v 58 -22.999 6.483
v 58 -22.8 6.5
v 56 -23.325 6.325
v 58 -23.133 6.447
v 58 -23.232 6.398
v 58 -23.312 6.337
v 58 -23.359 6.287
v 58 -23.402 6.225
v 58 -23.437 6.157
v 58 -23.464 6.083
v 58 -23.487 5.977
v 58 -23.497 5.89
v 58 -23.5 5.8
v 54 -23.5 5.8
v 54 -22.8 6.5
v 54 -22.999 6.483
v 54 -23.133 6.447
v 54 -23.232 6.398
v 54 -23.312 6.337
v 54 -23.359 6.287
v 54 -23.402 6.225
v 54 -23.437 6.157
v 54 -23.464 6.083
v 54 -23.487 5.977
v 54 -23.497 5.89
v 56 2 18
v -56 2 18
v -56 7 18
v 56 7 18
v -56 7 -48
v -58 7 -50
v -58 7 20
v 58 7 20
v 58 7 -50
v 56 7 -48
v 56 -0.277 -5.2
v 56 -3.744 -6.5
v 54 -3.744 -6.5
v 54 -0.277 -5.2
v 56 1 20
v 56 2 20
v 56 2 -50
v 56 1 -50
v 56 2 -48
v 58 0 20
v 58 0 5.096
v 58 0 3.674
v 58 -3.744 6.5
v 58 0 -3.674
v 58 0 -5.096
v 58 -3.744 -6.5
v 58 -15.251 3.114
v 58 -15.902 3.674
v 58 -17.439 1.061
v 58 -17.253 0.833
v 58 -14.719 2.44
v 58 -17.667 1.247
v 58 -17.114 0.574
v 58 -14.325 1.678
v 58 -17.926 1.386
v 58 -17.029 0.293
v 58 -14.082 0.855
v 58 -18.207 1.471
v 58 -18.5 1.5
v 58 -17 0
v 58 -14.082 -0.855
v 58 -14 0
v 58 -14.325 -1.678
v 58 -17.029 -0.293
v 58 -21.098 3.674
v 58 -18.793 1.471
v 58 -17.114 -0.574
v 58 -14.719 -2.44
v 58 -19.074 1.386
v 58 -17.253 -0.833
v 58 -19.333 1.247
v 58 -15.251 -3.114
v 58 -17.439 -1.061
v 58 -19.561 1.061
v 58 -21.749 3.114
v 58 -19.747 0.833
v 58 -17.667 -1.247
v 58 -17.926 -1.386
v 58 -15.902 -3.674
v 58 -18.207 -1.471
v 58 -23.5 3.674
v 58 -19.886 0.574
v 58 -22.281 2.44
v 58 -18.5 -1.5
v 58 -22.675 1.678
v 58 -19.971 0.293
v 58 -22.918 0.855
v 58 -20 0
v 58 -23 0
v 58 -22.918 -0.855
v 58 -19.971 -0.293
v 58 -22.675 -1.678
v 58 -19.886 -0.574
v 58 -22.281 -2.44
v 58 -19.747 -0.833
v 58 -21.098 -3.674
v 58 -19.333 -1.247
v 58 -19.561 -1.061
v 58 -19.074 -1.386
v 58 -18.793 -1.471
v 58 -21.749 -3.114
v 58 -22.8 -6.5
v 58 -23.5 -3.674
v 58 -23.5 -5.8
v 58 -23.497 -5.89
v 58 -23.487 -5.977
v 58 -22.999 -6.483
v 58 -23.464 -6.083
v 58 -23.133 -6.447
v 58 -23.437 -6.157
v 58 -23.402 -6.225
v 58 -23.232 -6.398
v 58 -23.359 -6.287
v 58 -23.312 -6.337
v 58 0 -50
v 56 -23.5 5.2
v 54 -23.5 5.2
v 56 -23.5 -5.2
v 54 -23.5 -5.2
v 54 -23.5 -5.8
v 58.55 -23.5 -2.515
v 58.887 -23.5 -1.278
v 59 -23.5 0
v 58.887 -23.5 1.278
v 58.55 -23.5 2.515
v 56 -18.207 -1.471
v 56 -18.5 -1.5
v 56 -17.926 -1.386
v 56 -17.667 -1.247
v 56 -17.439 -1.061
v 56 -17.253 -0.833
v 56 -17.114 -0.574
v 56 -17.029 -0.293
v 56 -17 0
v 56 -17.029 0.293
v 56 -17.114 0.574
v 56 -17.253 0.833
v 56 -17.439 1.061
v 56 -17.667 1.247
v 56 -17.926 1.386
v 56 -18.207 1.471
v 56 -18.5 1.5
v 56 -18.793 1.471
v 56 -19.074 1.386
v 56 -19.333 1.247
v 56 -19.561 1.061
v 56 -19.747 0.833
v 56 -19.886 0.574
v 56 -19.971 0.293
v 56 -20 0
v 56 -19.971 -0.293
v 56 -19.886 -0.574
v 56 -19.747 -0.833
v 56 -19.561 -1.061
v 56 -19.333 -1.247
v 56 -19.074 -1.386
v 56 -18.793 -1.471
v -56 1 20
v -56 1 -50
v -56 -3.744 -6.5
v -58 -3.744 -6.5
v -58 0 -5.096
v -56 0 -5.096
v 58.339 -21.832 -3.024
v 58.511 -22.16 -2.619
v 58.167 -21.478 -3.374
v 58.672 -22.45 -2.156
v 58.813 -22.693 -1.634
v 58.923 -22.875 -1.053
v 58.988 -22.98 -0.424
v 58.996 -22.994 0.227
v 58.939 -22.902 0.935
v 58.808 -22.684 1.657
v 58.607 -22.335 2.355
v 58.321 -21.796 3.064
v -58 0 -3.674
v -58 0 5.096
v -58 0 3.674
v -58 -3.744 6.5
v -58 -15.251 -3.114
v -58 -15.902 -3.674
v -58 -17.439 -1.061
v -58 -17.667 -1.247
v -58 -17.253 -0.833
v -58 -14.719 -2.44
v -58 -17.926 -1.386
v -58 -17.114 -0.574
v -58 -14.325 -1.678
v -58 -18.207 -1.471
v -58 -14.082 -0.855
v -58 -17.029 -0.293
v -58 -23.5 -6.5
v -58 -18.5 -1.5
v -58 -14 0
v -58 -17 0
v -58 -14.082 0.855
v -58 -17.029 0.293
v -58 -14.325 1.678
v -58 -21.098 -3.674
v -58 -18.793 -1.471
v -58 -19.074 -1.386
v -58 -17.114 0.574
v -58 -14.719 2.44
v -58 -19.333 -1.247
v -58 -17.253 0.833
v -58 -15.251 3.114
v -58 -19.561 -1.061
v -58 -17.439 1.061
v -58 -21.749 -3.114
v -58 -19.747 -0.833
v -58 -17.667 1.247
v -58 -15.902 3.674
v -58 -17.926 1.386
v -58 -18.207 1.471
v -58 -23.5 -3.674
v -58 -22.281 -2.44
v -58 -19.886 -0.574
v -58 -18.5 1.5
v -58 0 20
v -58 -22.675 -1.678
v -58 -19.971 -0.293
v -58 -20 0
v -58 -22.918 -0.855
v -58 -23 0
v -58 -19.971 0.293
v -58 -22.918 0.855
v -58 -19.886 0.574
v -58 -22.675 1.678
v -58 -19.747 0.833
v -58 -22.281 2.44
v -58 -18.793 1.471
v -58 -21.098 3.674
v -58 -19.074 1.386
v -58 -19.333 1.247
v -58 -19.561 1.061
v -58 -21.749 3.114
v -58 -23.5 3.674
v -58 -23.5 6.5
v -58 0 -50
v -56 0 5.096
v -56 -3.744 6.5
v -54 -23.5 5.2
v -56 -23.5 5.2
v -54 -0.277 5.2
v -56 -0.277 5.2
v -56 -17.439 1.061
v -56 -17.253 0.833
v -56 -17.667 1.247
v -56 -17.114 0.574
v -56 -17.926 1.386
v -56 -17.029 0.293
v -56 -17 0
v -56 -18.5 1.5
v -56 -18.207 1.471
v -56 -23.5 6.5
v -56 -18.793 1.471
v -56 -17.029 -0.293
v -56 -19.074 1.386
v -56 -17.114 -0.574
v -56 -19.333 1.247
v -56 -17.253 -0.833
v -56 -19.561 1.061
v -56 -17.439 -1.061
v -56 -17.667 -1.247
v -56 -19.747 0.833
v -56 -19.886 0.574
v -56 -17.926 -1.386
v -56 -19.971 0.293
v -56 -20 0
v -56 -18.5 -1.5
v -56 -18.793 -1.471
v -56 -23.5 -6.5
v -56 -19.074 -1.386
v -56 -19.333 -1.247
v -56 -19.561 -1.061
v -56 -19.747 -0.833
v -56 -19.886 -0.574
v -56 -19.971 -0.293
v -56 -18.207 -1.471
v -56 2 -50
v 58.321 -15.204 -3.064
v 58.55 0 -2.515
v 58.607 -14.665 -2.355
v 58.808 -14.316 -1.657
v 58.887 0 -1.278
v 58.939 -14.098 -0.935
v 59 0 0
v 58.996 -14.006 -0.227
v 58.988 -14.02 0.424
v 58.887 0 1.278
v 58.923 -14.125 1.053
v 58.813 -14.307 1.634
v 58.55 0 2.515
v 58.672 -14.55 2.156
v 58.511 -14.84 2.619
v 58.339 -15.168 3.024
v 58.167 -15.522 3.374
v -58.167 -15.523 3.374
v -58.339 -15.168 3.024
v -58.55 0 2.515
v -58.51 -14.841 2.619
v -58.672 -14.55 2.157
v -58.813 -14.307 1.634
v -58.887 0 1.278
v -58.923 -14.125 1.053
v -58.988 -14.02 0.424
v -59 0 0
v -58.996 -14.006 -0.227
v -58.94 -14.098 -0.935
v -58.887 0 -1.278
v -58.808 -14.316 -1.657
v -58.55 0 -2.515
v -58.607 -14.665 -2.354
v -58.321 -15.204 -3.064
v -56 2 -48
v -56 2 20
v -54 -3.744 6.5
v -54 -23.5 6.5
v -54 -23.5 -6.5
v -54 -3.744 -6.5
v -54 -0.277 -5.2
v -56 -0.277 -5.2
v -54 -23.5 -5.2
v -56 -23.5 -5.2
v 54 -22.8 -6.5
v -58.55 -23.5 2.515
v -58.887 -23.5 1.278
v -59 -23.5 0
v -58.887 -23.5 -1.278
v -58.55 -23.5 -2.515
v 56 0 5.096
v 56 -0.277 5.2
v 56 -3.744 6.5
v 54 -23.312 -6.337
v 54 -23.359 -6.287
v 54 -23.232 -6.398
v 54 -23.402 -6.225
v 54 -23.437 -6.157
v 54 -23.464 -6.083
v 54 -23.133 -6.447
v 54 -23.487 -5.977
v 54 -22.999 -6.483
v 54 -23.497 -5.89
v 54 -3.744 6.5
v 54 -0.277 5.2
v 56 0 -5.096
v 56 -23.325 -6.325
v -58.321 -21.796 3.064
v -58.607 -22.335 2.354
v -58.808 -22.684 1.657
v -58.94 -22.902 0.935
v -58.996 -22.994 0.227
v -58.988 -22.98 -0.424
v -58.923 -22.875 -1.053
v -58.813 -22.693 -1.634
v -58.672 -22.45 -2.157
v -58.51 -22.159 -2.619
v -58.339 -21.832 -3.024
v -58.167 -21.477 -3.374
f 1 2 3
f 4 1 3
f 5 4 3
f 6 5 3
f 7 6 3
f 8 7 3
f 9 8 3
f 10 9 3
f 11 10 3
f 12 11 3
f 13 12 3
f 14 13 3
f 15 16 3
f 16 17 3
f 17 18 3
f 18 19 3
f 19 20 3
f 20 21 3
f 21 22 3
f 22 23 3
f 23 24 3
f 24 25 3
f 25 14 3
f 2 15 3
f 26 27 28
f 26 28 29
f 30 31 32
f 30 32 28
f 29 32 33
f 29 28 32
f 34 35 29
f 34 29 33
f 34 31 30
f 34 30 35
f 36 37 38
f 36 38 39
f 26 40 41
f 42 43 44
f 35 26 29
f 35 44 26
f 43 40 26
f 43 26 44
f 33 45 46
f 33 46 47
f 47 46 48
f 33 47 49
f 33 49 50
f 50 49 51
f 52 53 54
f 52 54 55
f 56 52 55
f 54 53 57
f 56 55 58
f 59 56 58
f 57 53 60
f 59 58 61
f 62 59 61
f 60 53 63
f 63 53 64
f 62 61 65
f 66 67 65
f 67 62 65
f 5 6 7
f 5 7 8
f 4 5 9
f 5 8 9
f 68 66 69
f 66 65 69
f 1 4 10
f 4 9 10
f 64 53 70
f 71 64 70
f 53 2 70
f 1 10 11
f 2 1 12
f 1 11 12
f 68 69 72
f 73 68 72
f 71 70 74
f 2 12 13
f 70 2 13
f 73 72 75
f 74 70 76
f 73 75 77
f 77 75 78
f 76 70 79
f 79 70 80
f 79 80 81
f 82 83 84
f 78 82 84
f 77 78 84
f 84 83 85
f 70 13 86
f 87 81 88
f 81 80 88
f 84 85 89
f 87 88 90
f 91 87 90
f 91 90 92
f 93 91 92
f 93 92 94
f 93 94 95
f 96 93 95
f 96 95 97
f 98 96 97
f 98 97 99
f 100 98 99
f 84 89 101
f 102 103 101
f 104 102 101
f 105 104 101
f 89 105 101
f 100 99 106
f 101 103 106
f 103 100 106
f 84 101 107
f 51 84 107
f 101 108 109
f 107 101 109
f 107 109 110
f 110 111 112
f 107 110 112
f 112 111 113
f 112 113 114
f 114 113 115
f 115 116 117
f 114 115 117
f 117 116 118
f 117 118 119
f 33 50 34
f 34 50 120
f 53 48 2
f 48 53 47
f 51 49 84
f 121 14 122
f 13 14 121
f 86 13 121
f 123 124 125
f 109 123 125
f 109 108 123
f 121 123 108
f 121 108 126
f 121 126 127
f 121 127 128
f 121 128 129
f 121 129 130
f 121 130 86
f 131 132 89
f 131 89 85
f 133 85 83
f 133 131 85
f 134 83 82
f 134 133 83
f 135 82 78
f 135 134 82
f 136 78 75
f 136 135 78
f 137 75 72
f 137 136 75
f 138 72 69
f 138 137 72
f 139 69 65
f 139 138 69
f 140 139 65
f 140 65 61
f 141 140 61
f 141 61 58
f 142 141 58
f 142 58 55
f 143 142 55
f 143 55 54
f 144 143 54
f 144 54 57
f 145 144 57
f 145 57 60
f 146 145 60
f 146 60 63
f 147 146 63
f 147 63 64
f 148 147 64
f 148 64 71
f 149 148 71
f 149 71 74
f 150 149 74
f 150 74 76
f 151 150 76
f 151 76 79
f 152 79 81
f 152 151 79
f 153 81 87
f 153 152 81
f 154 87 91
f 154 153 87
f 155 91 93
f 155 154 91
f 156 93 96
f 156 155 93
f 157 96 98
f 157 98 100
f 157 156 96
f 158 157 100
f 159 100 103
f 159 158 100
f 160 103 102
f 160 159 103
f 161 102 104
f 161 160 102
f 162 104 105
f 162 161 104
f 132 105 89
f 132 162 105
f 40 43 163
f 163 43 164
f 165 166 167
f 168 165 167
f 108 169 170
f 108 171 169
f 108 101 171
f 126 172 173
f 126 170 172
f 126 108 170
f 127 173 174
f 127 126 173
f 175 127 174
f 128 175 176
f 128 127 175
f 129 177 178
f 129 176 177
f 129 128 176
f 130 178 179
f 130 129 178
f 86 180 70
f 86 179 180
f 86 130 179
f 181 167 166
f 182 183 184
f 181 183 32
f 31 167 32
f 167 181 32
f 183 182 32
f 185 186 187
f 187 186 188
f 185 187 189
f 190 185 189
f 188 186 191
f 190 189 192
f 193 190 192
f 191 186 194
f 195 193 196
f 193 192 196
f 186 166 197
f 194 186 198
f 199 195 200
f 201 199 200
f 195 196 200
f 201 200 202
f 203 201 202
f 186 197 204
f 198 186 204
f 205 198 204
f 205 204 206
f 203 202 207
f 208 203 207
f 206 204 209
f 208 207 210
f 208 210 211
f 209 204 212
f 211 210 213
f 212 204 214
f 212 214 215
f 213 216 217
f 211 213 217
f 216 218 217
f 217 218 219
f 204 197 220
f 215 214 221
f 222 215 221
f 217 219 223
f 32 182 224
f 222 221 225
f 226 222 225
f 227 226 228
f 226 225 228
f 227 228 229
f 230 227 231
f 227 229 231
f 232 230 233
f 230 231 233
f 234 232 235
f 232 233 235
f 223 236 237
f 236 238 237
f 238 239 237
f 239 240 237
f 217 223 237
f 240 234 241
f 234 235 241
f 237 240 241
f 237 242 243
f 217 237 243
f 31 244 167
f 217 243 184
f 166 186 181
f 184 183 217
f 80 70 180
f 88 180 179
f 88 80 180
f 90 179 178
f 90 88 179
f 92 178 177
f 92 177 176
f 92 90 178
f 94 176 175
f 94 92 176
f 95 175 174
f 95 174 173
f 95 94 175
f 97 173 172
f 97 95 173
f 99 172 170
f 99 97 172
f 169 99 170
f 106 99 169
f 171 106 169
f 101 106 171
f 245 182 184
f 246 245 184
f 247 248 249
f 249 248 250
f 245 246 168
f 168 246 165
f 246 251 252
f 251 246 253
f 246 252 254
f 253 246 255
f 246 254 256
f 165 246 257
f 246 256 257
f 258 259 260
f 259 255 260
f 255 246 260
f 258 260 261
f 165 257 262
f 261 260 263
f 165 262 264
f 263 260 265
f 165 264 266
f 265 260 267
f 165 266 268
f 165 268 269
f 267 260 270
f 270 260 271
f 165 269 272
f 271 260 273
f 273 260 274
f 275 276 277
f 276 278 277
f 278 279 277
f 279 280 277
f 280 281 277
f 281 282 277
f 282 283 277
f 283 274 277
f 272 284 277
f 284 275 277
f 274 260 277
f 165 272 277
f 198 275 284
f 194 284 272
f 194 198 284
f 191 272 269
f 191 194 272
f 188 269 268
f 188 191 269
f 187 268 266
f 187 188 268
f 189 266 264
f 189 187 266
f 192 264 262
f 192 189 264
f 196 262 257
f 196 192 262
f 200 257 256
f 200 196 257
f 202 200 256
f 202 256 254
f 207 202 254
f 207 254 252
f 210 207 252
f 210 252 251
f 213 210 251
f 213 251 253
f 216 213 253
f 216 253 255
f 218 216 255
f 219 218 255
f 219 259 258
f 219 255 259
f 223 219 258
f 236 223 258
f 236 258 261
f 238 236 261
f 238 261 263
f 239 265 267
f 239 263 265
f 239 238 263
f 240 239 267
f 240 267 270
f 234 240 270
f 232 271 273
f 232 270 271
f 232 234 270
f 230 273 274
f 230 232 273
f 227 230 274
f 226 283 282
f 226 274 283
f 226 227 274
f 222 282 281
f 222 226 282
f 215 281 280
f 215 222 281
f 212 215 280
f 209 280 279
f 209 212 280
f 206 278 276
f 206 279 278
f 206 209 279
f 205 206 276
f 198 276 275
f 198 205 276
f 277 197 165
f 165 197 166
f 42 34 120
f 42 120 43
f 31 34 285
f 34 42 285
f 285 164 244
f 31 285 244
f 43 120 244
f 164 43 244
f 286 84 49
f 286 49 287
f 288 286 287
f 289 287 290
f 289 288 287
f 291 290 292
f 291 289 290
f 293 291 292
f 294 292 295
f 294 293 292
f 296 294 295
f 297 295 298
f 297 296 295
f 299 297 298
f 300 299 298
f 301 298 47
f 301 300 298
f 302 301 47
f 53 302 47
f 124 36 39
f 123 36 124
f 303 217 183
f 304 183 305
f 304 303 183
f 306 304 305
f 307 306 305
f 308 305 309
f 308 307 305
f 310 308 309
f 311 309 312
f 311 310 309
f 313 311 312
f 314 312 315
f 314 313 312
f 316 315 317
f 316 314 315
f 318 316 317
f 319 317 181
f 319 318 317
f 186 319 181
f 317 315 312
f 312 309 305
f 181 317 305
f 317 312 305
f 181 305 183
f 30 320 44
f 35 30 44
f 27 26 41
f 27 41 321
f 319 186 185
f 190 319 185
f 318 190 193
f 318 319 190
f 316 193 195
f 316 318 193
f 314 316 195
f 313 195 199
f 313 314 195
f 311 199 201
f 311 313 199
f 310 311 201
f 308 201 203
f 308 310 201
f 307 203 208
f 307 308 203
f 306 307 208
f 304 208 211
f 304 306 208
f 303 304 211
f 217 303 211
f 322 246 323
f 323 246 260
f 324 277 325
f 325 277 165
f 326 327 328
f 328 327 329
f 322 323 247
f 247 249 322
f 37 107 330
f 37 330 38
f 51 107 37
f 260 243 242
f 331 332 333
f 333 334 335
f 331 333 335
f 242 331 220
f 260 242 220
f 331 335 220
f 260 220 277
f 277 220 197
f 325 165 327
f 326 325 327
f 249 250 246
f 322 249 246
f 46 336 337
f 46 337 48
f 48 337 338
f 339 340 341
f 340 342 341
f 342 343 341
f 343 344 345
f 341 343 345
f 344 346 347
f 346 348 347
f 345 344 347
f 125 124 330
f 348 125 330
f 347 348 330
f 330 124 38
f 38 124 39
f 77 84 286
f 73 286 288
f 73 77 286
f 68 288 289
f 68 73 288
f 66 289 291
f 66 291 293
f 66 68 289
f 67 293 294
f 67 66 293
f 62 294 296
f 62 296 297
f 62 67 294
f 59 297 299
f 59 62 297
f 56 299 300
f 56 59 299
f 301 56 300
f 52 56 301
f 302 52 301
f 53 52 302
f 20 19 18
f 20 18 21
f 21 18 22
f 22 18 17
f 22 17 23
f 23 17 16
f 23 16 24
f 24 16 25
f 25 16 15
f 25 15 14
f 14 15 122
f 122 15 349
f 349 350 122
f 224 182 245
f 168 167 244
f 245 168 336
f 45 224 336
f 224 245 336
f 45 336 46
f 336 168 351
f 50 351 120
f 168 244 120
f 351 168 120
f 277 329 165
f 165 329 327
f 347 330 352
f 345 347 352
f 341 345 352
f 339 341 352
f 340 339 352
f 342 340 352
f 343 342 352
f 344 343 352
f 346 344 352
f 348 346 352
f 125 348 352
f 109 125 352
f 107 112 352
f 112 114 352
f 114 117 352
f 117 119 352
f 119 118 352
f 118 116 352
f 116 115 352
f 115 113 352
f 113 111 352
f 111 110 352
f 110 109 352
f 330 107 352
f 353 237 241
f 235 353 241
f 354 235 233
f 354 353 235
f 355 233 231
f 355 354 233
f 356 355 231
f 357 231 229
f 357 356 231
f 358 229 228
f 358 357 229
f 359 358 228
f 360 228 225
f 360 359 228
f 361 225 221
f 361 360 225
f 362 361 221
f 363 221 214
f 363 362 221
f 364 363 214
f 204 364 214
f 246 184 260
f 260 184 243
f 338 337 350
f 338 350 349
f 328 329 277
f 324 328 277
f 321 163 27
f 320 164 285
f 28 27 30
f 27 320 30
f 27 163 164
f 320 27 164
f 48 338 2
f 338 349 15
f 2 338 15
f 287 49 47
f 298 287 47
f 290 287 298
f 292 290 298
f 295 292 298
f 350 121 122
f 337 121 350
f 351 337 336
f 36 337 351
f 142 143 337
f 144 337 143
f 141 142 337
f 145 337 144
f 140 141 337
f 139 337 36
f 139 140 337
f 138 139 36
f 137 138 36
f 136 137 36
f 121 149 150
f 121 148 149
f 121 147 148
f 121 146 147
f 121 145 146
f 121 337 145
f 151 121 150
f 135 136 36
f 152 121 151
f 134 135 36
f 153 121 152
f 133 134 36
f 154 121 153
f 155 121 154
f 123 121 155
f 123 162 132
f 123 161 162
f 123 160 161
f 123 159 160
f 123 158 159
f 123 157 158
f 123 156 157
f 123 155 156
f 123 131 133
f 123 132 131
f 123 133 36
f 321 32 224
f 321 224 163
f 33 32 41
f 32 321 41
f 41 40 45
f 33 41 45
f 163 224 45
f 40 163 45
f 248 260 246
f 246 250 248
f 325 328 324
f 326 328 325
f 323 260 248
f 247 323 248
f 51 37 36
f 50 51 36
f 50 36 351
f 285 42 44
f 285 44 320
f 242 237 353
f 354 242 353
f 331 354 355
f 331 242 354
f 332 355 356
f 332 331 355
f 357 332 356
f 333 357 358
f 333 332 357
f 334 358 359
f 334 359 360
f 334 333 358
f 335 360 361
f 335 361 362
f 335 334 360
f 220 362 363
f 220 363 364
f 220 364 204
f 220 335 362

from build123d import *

# Parameters (mm, degrees)
DODANIE_WYCI_GNI_CIE1_DEPTH     = 2
DODANIE_WYCI_GNI_CIE2_DEPTH     = 2
DODANIE_WYCI_GNI_CIE3_START     = -114
DODANIE_WYCI_GNI_CIE3_DEPTH     = 2
DODANIE_WYCI_GNI_CIE4_START     = -112
DODANIE_WYCI_GNI_CIE4_DEPTH     = 2
DODANIE_WYCI_GNI_CIE4_2_DEPTH   = 2
WYTNIJ_WYCI_GNI_CIE1_DEPTH      = 118.556369457
WYTNIJ_WYCI_GNI_CIE1_DEPTH_BACK = 118.556369457
SZKIC4_R                        = 1.5
ZAOKR_GLENIE18_SIZE             = 0.7
WYTNIJ_WYCI_GNI_CIE2_START      = 2
SZKIC4_3_R                      = 4.5
SZKIC4_3_R_2                    = 1.5
WYTNIJ_WYCI_GNI_CIE2_DEPTH      = 10
WYTNIJ_WYCI_GNI_CIE3_START      = -116
SZKIC4_4_R                      = 4.5
SZKIC4_4_R_2                    = 1.5
WYTNIJ_WYCI_GNI_CIE3_DEPTH      = 2
SZKIC9_W                        = 112
SZKIC9_H                        = 66
DODANIE_WYCI_GNI_CIE5_DEPTH     = 7
SZKIC9_4_W                      = 112
SZKIC9_4_H                      = 66
DODANIE_WYCI_GNI_CIE6_DEPTH     = 1
SZKIC11_W                       = 112
SZKIC11_H                       = 1
WYTNIJ_WYCI_GNI_CIE4_DEPTH      = 95.515871844


with BuildPart() as part:
    # Wyciągnięcie po ścieżce6: sweep along a path in Szkic8
    with BuildLine(Plane.XY) as wyci_gni_cie_po_cie_ce6_path:
        Line((-57, 0), (-57, -23.5))
    # Szkic3 → Wyciągnięcie po ścieżce6 (sweep)
    with BuildSketch(Plane(origin=(0, 0, 0), x_dir=(1, 0, 0), z_dir=(0, 1, 0))):
        with BuildLine():
            Line((56, 5), (57, 5))
            ThreePointArc((57, 5), (59, 0), (57, -5))
            Line((57, -5), (56, -5))
            Line((56, -5), (56, 5))
        make_face()
        with BuildLine():
            Line((-56, -5), (-57, -5))
            ThreePointArc((-57, -5), (-59, 0), (-57, 5))
            Line((-57, 5), (-56, 5))
            Line((-56, 5), (-56, -5))
        make_face()
    sweep(path=wyci_gni_cie_po_cie_ce6_path.line)

    # Dodanie-wyciągnięcie1: read off the stored shape, not the designer's step
    # Dodanie-wyciągnięcie1 outline → Dodanie-wyciągnięcie1 (add)
    with BuildSketch(Plane(origin=(56, 0, 0), x_dir=(0, 0, -1), z_dir=(1, 0, 0))):
        Polygon((-6.5, -3.743926041), (-6.5, -23.5), (6.5, -23.5), (6.5, -3.743926041), (5, 0.256073959), (5, 0), (-5, 0), (-5, 0.256073959), align=None)
    extrude(amount=DODANIE_WYCI_GNI_CIE1_DEPTH)

    # Szkic5<3> → Dodanie-wyciągnięcie2 (add)
    with BuildSketch(Plane(origin=(56, 0, 0), x_dir=(0, 0, -1), z_dir=(1, 0, 0))):
        Polygon((6.5, -3.743926041), (5.2, -0.277259374), (5.2, -23.5), (6.5, -23.5), align=None)
        Polygon((-5.2, -0.277259374), (-6.5, -3.743926041), (-6.5, -23.5), (-5.2, -23.5), align=None)
    extrude(amount=-DODANIE_WYCI_GNI_CIE2_DEPTH)


with BuildPart() as body_2:
    # Dodanie-wyciągnięcie3: read off the stored shape, not the designer's step
    # Dodanie-wyciągnięcie3 outline → Dodanie-wyciągnięcie3 (new body)
    with BuildSketch(Plane(origin=(56, 0, 0), x_dir=(0, 0, -1), z_dir=(1, 0, 0)).offset(DODANIE_WYCI_GNI_CIE3_START)):
        Polygon((5, 0.256073959), (5, 0), (-5, 0), (-5, 0.256073959), (-6.5, -3.743926041), (-6.5, -23.5), (6.5, -23.5), (6.5, -3.743926041), align=None)
    extrude(amount=DODANIE_WYCI_GNI_CIE3_DEPTH)


with BuildPart() as body_3:
    # Szkic5<6> → Dodanie-wyciągnięcie4 (new body)
    with BuildSketch(Plane(origin=(56, 0, 0), x_dir=(0, 0, -1), z_dir=(1, 0, 0)).offset(DODANIE_WYCI_GNI_CIE4_START)):
        Polygon((-5.2, -0.277259374), (-6.5, -3.743926041), (-6.5, -23.5), (-5.2, -23.5), align=None)
    extrude(amount=DODANIE_WYCI_GNI_CIE4_DEPTH)


with BuildPart() as body_4:
    # Szkic5<6> → Dodanie-wyci_gni_cie4 2 (new body)
    with BuildSketch(Plane(origin=(56, 0, 0), x_dir=(0, 0, -1), z_dir=(1, 0, 0)).offset(DODANIE_WYCI_GNI_CIE4_START)):
        Polygon((6.5, -3.743926041), (5.2, -0.277259374), (5.2, -23.5), (6.5, -23.5), align=None)
    extrude(amount=DODANIE_WYCI_GNI_CIE4_2_DEPTH)


with BuildPart() as wytnij_wyci_gni_cie1_tool:
    # Szkic4 → Wytnij-wyciągnięcie1 (new, two sides: drawn at the far end of the back side and taken through both)
    with BuildSketch(Plane(origin=(56, 0, 0), x_dir=(0, 0, -1), z_dir=(1, 0, 0)).offset(-WYTNIJ_WYCI_GNI_CIE1_DEPTH_BACK)):
        with Locations((0, -18.5)):
            Circle(SZKIC4_R)
    extrude(amount=WYTNIJ_WYCI_GNI_CIE1_DEPTH + WYTNIJ_WYCI_GNI_CIE1_DEPTH_BACK)


with BuildPart() as part_1:
    add(part.part)

    # Wytnij-wyciągnięcie1: cut by wytnij_wyci_gni_cie1_tool
    add(wytnij_wyci_gni_cie1_tool.part, mode=Mode.SUBTRACT)

    # Zaokrąglenie18
    # a fillet whose section is not a circle: 0.7 mm, written as the material it takes off along each edge
    with BuildSketch(Plane(origin=(59.75, -23.5, 6.5), x_dir=(0, 0, -1), z_dir=(-1, 0, 0)), Plane(origin=(52.25, -23.5, -6.5), x_dir=(0, 0, 1), z_dir=(1, 0, 0))) as zaokr_glenie18_piece_1:
        with BuildLine():
            Bezier((ZAOKR_GLENIE18_SIZE, 0), (0, 0), (0, -ZAOKR_GLENIE18_SIZE), weights=[1, 1, 1])
            Line((0, -ZAOKR_GLENIE18_SIZE), (0, 0))
            Line((0, 0), (ZAOKR_GLENIE18_SIZE, 0))
        make_face()
    extrude(amount=7.5, mode=Mode.SUBTRACT)

    # Szkic4<3> → Wytnij-wyciągnięcie2 (cut)
    with BuildSketch(Plane(origin=(56, 0, 0), x_dir=(0, 0, -1), z_dir=(1, 0, 0)).offset(WYTNIJ_WYCI_GNI_CIE2_START)):
        with Locations((0, -18.5)):
            Circle(SZKIC4_3_R)
        with Locations((0, -18.5)):
            Circle(SZKIC4_3_R_2, mode=Mode.SUBTRACT)
    extrude(amount=WYTNIJ_WYCI_GNI_CIE2_DEPTH, mode=Mode.SUBTRACT)

    # Szkic4<4> → Wytnij-wyciągnięcie3 (cut)
    with BuildSketch(Plane(origin=(56, 0, 0), x_dir=(0, 0, -1), z_dir=(1, 0, 0)).offset(WYTNIJ_WYCI_GNI_CIE3_START)):
        with Locations((0, -18.5)):
            Circle(SZKIC4_4_R)
        with Locations((0, -18.5)):
            Circle(SZKIC4_4_R_2, mode=Mode.SUBTRACT)
    extrude(amount=WYTNIJ_WYCI_GNI_CIE3_DEPTH, mode=Mode.SUBTRACT)



with BuildPart() as body_2_1:
    add(body_2.part)

    # Wytnij-wyciągnięcie1: cut by wytnij_wyci_gni_cie1_tool
    add(wytnij_wyci_gni_cie1_tool.part, mode=Mode.SUBTRACT)


with BuildPart() as part_2:
    add(part_1.part)

    add(body_2_1.part)  # Dodanie-wyciągnięcie5 merges body 2
    # Szkic9 → Dodanie-wyciągnięcie5 (add)
    with BuildSketch(Plane(origin=(0, 0, 0), x_dir=(1, 0, 0), z_dir=(0, 1, 0))):
        Polygon((58, -5), (58, 50), (-58, 50), (-58, -5), (-58, -20), (58, -20), align=None)
        with Locations((0, 15)):
            Rectangle(SZKIC9_W, SZKIC9_H, mode=Mode.SUBTRACT)
    extrude(amount=DODANIE_WYCI_GNI_CIE5_DEPTH)

    # Szkic9<4> → Dodanie-wyciągnięcie6 (add)
    with BuildSketch(Plane(origin=(0, 0, 0), x_dir=(1, 0, 0), z_dir=(0, 1, 0))):
        with Locations((0, 15)):
            Rectangle(SZKIC9_4_W, SZKIC9_4_H)
    extrude(amount=DODANIE_WYCI_GNI_CIE6_DEPTH)

    # Szkic11 → Wytnij-wyciągnięcie4 (cut, through all)
    with BuildSketch(Plane(origin=(0, 0, -50), x_dir=(-1, 0, 0), z_dir=(0, 0, -1))):
        with Locations((0, 1.5)):
            Rectangle(SZKIC11_W, SZKIC11_H)
    extrude(amount=-WYTNIJ_WYCI_GNI_CIE4_DEPTH, mode=Mode.SUBTRACT)


solid = Compound([body_3.part, body_4.part, part_2.part])
